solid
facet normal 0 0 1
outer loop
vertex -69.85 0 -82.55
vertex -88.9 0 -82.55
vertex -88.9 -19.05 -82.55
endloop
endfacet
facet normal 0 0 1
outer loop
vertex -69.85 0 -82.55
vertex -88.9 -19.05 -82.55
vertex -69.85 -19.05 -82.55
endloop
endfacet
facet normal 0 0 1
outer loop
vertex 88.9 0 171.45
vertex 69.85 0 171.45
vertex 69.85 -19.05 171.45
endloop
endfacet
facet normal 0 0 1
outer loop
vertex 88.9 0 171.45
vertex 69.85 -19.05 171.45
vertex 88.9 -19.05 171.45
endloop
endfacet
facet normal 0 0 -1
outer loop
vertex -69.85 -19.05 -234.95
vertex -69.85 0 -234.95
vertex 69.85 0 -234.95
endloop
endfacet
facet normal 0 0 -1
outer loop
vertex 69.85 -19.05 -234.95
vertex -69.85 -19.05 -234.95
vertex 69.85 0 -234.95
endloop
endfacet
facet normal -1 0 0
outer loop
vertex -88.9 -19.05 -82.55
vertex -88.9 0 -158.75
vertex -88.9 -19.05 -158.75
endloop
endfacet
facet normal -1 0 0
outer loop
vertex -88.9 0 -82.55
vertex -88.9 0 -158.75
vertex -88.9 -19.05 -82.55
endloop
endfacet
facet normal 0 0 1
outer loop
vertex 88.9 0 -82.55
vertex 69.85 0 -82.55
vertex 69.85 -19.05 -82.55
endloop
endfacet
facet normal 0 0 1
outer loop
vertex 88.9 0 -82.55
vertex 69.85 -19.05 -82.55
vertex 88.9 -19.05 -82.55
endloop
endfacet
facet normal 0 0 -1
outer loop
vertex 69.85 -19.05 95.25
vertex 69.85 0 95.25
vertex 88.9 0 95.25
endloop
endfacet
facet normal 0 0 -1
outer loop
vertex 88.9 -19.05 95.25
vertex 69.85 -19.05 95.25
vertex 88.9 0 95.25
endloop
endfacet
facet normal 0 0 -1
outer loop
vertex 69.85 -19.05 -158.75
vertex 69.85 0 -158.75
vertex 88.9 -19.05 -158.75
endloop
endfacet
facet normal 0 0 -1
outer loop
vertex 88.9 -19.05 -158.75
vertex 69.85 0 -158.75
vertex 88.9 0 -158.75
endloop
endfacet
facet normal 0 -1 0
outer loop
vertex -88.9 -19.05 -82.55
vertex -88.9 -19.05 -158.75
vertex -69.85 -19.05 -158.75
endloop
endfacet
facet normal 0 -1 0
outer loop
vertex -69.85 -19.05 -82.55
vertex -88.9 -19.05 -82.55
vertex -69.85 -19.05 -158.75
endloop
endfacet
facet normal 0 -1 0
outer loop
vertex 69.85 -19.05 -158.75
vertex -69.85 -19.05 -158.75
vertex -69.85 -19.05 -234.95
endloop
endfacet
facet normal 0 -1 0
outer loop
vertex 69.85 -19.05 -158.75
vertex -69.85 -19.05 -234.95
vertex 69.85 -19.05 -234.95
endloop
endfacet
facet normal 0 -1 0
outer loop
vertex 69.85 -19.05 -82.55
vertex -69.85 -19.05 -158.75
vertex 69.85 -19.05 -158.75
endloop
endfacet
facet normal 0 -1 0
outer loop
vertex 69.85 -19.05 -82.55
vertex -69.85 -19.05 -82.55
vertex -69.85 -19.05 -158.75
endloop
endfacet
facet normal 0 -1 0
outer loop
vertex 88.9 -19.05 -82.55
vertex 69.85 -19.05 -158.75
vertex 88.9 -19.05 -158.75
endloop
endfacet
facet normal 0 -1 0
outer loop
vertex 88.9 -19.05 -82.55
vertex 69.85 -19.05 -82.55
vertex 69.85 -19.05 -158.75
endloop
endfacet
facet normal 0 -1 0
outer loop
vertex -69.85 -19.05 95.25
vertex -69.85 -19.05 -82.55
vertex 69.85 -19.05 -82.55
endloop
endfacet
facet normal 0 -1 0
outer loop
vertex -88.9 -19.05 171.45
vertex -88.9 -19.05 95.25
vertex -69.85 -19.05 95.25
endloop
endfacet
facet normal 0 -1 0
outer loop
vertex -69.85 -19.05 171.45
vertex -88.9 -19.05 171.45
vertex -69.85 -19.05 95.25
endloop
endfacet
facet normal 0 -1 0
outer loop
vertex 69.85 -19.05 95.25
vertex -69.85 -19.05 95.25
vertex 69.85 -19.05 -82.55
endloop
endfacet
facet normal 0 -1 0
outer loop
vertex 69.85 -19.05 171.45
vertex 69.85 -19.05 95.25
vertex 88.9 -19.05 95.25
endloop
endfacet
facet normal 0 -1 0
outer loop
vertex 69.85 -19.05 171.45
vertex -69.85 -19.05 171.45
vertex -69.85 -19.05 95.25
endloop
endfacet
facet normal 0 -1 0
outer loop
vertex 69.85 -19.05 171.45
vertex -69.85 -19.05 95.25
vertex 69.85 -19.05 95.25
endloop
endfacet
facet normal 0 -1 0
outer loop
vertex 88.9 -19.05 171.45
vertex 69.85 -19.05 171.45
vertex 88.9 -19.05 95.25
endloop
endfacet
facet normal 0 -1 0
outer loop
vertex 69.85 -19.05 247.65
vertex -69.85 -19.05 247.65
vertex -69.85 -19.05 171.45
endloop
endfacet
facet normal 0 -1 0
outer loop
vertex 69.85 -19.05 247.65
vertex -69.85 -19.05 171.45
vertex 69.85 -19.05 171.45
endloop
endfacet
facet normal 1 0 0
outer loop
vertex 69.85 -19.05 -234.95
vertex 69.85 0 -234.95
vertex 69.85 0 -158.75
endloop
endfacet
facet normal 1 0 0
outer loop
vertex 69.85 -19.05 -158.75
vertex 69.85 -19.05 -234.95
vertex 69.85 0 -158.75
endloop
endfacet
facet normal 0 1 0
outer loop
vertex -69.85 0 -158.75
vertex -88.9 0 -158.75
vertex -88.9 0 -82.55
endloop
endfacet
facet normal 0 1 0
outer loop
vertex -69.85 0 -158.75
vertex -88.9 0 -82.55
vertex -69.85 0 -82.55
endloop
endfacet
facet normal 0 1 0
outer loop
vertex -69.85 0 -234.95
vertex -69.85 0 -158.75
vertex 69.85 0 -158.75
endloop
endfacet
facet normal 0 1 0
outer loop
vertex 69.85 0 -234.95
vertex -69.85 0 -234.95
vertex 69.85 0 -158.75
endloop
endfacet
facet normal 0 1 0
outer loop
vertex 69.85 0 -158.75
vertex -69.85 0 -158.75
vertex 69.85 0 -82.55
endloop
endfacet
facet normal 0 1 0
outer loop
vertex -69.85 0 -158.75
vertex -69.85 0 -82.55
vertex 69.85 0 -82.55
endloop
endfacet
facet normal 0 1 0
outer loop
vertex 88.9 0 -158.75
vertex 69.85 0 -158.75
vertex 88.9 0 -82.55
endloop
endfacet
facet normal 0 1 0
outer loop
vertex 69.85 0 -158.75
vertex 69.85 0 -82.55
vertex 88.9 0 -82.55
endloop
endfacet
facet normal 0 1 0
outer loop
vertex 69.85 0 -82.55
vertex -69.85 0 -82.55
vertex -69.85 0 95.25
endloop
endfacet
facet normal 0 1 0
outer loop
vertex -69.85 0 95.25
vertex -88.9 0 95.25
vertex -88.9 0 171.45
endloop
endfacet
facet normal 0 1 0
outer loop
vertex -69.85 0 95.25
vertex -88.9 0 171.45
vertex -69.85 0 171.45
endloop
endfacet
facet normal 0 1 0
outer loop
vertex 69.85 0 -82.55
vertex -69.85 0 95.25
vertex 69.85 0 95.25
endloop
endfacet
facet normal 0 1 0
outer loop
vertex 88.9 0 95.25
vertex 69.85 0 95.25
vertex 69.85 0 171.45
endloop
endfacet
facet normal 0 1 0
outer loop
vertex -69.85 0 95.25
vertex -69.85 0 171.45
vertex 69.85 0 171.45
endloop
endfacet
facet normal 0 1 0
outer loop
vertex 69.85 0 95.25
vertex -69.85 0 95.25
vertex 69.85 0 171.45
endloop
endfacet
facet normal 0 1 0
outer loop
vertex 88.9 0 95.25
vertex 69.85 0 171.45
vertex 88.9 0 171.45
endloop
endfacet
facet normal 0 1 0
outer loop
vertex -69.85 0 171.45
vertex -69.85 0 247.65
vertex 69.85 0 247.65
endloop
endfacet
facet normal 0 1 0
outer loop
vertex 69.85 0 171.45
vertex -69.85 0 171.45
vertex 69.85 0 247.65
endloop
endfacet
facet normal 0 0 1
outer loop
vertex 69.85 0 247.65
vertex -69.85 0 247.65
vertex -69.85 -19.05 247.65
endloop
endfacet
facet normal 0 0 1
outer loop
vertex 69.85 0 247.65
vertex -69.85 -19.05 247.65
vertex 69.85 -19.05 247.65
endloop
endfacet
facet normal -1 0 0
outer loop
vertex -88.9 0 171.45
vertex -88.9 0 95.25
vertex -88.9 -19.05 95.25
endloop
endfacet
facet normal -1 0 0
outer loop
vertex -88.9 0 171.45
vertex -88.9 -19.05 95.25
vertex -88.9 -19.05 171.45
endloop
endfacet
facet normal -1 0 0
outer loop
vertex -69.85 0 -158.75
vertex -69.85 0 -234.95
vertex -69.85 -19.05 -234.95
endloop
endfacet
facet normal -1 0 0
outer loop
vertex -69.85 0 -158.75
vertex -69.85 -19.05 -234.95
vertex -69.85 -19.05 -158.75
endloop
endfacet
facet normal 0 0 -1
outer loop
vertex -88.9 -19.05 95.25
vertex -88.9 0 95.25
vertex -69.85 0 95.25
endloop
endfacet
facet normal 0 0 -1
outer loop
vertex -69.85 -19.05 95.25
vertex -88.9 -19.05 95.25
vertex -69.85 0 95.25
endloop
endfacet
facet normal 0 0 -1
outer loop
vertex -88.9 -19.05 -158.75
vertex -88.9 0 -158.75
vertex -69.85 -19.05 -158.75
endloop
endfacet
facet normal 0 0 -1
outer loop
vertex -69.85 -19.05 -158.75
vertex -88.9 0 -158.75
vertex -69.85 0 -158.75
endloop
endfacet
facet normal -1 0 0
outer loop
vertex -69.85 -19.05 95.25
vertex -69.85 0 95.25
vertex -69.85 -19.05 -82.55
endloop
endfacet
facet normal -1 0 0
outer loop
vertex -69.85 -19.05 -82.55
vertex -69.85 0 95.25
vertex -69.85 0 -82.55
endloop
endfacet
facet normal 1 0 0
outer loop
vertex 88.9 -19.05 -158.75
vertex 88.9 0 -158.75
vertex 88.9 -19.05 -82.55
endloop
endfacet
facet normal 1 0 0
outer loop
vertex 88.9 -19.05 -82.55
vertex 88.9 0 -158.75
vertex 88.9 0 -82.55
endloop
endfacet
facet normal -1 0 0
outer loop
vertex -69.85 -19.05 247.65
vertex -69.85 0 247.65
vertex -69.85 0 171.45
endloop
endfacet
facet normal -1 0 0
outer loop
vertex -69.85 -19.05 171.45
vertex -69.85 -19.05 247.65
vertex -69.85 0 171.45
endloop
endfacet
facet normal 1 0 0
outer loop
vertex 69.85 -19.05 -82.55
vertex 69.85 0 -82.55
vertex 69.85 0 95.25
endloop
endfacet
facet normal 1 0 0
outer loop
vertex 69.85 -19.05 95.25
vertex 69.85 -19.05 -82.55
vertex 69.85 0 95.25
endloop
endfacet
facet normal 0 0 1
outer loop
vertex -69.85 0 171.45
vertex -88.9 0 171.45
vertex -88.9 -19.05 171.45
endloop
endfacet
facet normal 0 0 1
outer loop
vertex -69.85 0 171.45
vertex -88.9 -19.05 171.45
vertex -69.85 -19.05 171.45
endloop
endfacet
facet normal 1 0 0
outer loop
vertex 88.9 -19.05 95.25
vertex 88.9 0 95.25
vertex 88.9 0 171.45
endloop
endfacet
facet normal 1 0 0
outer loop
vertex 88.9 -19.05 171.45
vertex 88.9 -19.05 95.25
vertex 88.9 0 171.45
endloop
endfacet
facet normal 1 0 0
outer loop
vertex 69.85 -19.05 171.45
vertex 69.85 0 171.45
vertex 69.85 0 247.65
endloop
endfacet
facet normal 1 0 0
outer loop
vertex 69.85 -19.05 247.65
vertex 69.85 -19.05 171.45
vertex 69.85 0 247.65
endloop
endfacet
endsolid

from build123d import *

# Parameters (mm, degrees)
F0_W     = 139.7
F0_H     = 76.2
F0_W_2   = 19.05
F1_DEPTH = 19.05


with BuildPart() as f1:
    # F0 (on Front) → F1 (new body)
    with BuildSketch(Plane.XZ):
        with Locations((0, 209.55)):
            Rectangle(F0_W, F0_H)
        Polygon((69.85, 171.45), (-69.85, 171.45), (-69.85, 95.25), (-69.85, -82.55), (-69.85, -158.75), (69.85, -158.75), (69.85, -82.55), (69.85, 95.25), align=None)
        with Locations((-79.375, 133.35)):
            Rectangle(F0_W_2, F0_H)
        with Locations((79.375, 133.35)):
            Rectangle(F0_W_2, F0_H)
        with Locations((-79.375, -120.65)):
            Rectangle(F0_W_2, F0_H)
        with Locations((79.375, -120.65)):
            Rectangle(F0_W_2, F0_H)
        with Locations((0, -196.85)):
            Rectangle(F0_W, F0_H)
    extrude(amount=F1_DEPTH)


solid = f1.part
